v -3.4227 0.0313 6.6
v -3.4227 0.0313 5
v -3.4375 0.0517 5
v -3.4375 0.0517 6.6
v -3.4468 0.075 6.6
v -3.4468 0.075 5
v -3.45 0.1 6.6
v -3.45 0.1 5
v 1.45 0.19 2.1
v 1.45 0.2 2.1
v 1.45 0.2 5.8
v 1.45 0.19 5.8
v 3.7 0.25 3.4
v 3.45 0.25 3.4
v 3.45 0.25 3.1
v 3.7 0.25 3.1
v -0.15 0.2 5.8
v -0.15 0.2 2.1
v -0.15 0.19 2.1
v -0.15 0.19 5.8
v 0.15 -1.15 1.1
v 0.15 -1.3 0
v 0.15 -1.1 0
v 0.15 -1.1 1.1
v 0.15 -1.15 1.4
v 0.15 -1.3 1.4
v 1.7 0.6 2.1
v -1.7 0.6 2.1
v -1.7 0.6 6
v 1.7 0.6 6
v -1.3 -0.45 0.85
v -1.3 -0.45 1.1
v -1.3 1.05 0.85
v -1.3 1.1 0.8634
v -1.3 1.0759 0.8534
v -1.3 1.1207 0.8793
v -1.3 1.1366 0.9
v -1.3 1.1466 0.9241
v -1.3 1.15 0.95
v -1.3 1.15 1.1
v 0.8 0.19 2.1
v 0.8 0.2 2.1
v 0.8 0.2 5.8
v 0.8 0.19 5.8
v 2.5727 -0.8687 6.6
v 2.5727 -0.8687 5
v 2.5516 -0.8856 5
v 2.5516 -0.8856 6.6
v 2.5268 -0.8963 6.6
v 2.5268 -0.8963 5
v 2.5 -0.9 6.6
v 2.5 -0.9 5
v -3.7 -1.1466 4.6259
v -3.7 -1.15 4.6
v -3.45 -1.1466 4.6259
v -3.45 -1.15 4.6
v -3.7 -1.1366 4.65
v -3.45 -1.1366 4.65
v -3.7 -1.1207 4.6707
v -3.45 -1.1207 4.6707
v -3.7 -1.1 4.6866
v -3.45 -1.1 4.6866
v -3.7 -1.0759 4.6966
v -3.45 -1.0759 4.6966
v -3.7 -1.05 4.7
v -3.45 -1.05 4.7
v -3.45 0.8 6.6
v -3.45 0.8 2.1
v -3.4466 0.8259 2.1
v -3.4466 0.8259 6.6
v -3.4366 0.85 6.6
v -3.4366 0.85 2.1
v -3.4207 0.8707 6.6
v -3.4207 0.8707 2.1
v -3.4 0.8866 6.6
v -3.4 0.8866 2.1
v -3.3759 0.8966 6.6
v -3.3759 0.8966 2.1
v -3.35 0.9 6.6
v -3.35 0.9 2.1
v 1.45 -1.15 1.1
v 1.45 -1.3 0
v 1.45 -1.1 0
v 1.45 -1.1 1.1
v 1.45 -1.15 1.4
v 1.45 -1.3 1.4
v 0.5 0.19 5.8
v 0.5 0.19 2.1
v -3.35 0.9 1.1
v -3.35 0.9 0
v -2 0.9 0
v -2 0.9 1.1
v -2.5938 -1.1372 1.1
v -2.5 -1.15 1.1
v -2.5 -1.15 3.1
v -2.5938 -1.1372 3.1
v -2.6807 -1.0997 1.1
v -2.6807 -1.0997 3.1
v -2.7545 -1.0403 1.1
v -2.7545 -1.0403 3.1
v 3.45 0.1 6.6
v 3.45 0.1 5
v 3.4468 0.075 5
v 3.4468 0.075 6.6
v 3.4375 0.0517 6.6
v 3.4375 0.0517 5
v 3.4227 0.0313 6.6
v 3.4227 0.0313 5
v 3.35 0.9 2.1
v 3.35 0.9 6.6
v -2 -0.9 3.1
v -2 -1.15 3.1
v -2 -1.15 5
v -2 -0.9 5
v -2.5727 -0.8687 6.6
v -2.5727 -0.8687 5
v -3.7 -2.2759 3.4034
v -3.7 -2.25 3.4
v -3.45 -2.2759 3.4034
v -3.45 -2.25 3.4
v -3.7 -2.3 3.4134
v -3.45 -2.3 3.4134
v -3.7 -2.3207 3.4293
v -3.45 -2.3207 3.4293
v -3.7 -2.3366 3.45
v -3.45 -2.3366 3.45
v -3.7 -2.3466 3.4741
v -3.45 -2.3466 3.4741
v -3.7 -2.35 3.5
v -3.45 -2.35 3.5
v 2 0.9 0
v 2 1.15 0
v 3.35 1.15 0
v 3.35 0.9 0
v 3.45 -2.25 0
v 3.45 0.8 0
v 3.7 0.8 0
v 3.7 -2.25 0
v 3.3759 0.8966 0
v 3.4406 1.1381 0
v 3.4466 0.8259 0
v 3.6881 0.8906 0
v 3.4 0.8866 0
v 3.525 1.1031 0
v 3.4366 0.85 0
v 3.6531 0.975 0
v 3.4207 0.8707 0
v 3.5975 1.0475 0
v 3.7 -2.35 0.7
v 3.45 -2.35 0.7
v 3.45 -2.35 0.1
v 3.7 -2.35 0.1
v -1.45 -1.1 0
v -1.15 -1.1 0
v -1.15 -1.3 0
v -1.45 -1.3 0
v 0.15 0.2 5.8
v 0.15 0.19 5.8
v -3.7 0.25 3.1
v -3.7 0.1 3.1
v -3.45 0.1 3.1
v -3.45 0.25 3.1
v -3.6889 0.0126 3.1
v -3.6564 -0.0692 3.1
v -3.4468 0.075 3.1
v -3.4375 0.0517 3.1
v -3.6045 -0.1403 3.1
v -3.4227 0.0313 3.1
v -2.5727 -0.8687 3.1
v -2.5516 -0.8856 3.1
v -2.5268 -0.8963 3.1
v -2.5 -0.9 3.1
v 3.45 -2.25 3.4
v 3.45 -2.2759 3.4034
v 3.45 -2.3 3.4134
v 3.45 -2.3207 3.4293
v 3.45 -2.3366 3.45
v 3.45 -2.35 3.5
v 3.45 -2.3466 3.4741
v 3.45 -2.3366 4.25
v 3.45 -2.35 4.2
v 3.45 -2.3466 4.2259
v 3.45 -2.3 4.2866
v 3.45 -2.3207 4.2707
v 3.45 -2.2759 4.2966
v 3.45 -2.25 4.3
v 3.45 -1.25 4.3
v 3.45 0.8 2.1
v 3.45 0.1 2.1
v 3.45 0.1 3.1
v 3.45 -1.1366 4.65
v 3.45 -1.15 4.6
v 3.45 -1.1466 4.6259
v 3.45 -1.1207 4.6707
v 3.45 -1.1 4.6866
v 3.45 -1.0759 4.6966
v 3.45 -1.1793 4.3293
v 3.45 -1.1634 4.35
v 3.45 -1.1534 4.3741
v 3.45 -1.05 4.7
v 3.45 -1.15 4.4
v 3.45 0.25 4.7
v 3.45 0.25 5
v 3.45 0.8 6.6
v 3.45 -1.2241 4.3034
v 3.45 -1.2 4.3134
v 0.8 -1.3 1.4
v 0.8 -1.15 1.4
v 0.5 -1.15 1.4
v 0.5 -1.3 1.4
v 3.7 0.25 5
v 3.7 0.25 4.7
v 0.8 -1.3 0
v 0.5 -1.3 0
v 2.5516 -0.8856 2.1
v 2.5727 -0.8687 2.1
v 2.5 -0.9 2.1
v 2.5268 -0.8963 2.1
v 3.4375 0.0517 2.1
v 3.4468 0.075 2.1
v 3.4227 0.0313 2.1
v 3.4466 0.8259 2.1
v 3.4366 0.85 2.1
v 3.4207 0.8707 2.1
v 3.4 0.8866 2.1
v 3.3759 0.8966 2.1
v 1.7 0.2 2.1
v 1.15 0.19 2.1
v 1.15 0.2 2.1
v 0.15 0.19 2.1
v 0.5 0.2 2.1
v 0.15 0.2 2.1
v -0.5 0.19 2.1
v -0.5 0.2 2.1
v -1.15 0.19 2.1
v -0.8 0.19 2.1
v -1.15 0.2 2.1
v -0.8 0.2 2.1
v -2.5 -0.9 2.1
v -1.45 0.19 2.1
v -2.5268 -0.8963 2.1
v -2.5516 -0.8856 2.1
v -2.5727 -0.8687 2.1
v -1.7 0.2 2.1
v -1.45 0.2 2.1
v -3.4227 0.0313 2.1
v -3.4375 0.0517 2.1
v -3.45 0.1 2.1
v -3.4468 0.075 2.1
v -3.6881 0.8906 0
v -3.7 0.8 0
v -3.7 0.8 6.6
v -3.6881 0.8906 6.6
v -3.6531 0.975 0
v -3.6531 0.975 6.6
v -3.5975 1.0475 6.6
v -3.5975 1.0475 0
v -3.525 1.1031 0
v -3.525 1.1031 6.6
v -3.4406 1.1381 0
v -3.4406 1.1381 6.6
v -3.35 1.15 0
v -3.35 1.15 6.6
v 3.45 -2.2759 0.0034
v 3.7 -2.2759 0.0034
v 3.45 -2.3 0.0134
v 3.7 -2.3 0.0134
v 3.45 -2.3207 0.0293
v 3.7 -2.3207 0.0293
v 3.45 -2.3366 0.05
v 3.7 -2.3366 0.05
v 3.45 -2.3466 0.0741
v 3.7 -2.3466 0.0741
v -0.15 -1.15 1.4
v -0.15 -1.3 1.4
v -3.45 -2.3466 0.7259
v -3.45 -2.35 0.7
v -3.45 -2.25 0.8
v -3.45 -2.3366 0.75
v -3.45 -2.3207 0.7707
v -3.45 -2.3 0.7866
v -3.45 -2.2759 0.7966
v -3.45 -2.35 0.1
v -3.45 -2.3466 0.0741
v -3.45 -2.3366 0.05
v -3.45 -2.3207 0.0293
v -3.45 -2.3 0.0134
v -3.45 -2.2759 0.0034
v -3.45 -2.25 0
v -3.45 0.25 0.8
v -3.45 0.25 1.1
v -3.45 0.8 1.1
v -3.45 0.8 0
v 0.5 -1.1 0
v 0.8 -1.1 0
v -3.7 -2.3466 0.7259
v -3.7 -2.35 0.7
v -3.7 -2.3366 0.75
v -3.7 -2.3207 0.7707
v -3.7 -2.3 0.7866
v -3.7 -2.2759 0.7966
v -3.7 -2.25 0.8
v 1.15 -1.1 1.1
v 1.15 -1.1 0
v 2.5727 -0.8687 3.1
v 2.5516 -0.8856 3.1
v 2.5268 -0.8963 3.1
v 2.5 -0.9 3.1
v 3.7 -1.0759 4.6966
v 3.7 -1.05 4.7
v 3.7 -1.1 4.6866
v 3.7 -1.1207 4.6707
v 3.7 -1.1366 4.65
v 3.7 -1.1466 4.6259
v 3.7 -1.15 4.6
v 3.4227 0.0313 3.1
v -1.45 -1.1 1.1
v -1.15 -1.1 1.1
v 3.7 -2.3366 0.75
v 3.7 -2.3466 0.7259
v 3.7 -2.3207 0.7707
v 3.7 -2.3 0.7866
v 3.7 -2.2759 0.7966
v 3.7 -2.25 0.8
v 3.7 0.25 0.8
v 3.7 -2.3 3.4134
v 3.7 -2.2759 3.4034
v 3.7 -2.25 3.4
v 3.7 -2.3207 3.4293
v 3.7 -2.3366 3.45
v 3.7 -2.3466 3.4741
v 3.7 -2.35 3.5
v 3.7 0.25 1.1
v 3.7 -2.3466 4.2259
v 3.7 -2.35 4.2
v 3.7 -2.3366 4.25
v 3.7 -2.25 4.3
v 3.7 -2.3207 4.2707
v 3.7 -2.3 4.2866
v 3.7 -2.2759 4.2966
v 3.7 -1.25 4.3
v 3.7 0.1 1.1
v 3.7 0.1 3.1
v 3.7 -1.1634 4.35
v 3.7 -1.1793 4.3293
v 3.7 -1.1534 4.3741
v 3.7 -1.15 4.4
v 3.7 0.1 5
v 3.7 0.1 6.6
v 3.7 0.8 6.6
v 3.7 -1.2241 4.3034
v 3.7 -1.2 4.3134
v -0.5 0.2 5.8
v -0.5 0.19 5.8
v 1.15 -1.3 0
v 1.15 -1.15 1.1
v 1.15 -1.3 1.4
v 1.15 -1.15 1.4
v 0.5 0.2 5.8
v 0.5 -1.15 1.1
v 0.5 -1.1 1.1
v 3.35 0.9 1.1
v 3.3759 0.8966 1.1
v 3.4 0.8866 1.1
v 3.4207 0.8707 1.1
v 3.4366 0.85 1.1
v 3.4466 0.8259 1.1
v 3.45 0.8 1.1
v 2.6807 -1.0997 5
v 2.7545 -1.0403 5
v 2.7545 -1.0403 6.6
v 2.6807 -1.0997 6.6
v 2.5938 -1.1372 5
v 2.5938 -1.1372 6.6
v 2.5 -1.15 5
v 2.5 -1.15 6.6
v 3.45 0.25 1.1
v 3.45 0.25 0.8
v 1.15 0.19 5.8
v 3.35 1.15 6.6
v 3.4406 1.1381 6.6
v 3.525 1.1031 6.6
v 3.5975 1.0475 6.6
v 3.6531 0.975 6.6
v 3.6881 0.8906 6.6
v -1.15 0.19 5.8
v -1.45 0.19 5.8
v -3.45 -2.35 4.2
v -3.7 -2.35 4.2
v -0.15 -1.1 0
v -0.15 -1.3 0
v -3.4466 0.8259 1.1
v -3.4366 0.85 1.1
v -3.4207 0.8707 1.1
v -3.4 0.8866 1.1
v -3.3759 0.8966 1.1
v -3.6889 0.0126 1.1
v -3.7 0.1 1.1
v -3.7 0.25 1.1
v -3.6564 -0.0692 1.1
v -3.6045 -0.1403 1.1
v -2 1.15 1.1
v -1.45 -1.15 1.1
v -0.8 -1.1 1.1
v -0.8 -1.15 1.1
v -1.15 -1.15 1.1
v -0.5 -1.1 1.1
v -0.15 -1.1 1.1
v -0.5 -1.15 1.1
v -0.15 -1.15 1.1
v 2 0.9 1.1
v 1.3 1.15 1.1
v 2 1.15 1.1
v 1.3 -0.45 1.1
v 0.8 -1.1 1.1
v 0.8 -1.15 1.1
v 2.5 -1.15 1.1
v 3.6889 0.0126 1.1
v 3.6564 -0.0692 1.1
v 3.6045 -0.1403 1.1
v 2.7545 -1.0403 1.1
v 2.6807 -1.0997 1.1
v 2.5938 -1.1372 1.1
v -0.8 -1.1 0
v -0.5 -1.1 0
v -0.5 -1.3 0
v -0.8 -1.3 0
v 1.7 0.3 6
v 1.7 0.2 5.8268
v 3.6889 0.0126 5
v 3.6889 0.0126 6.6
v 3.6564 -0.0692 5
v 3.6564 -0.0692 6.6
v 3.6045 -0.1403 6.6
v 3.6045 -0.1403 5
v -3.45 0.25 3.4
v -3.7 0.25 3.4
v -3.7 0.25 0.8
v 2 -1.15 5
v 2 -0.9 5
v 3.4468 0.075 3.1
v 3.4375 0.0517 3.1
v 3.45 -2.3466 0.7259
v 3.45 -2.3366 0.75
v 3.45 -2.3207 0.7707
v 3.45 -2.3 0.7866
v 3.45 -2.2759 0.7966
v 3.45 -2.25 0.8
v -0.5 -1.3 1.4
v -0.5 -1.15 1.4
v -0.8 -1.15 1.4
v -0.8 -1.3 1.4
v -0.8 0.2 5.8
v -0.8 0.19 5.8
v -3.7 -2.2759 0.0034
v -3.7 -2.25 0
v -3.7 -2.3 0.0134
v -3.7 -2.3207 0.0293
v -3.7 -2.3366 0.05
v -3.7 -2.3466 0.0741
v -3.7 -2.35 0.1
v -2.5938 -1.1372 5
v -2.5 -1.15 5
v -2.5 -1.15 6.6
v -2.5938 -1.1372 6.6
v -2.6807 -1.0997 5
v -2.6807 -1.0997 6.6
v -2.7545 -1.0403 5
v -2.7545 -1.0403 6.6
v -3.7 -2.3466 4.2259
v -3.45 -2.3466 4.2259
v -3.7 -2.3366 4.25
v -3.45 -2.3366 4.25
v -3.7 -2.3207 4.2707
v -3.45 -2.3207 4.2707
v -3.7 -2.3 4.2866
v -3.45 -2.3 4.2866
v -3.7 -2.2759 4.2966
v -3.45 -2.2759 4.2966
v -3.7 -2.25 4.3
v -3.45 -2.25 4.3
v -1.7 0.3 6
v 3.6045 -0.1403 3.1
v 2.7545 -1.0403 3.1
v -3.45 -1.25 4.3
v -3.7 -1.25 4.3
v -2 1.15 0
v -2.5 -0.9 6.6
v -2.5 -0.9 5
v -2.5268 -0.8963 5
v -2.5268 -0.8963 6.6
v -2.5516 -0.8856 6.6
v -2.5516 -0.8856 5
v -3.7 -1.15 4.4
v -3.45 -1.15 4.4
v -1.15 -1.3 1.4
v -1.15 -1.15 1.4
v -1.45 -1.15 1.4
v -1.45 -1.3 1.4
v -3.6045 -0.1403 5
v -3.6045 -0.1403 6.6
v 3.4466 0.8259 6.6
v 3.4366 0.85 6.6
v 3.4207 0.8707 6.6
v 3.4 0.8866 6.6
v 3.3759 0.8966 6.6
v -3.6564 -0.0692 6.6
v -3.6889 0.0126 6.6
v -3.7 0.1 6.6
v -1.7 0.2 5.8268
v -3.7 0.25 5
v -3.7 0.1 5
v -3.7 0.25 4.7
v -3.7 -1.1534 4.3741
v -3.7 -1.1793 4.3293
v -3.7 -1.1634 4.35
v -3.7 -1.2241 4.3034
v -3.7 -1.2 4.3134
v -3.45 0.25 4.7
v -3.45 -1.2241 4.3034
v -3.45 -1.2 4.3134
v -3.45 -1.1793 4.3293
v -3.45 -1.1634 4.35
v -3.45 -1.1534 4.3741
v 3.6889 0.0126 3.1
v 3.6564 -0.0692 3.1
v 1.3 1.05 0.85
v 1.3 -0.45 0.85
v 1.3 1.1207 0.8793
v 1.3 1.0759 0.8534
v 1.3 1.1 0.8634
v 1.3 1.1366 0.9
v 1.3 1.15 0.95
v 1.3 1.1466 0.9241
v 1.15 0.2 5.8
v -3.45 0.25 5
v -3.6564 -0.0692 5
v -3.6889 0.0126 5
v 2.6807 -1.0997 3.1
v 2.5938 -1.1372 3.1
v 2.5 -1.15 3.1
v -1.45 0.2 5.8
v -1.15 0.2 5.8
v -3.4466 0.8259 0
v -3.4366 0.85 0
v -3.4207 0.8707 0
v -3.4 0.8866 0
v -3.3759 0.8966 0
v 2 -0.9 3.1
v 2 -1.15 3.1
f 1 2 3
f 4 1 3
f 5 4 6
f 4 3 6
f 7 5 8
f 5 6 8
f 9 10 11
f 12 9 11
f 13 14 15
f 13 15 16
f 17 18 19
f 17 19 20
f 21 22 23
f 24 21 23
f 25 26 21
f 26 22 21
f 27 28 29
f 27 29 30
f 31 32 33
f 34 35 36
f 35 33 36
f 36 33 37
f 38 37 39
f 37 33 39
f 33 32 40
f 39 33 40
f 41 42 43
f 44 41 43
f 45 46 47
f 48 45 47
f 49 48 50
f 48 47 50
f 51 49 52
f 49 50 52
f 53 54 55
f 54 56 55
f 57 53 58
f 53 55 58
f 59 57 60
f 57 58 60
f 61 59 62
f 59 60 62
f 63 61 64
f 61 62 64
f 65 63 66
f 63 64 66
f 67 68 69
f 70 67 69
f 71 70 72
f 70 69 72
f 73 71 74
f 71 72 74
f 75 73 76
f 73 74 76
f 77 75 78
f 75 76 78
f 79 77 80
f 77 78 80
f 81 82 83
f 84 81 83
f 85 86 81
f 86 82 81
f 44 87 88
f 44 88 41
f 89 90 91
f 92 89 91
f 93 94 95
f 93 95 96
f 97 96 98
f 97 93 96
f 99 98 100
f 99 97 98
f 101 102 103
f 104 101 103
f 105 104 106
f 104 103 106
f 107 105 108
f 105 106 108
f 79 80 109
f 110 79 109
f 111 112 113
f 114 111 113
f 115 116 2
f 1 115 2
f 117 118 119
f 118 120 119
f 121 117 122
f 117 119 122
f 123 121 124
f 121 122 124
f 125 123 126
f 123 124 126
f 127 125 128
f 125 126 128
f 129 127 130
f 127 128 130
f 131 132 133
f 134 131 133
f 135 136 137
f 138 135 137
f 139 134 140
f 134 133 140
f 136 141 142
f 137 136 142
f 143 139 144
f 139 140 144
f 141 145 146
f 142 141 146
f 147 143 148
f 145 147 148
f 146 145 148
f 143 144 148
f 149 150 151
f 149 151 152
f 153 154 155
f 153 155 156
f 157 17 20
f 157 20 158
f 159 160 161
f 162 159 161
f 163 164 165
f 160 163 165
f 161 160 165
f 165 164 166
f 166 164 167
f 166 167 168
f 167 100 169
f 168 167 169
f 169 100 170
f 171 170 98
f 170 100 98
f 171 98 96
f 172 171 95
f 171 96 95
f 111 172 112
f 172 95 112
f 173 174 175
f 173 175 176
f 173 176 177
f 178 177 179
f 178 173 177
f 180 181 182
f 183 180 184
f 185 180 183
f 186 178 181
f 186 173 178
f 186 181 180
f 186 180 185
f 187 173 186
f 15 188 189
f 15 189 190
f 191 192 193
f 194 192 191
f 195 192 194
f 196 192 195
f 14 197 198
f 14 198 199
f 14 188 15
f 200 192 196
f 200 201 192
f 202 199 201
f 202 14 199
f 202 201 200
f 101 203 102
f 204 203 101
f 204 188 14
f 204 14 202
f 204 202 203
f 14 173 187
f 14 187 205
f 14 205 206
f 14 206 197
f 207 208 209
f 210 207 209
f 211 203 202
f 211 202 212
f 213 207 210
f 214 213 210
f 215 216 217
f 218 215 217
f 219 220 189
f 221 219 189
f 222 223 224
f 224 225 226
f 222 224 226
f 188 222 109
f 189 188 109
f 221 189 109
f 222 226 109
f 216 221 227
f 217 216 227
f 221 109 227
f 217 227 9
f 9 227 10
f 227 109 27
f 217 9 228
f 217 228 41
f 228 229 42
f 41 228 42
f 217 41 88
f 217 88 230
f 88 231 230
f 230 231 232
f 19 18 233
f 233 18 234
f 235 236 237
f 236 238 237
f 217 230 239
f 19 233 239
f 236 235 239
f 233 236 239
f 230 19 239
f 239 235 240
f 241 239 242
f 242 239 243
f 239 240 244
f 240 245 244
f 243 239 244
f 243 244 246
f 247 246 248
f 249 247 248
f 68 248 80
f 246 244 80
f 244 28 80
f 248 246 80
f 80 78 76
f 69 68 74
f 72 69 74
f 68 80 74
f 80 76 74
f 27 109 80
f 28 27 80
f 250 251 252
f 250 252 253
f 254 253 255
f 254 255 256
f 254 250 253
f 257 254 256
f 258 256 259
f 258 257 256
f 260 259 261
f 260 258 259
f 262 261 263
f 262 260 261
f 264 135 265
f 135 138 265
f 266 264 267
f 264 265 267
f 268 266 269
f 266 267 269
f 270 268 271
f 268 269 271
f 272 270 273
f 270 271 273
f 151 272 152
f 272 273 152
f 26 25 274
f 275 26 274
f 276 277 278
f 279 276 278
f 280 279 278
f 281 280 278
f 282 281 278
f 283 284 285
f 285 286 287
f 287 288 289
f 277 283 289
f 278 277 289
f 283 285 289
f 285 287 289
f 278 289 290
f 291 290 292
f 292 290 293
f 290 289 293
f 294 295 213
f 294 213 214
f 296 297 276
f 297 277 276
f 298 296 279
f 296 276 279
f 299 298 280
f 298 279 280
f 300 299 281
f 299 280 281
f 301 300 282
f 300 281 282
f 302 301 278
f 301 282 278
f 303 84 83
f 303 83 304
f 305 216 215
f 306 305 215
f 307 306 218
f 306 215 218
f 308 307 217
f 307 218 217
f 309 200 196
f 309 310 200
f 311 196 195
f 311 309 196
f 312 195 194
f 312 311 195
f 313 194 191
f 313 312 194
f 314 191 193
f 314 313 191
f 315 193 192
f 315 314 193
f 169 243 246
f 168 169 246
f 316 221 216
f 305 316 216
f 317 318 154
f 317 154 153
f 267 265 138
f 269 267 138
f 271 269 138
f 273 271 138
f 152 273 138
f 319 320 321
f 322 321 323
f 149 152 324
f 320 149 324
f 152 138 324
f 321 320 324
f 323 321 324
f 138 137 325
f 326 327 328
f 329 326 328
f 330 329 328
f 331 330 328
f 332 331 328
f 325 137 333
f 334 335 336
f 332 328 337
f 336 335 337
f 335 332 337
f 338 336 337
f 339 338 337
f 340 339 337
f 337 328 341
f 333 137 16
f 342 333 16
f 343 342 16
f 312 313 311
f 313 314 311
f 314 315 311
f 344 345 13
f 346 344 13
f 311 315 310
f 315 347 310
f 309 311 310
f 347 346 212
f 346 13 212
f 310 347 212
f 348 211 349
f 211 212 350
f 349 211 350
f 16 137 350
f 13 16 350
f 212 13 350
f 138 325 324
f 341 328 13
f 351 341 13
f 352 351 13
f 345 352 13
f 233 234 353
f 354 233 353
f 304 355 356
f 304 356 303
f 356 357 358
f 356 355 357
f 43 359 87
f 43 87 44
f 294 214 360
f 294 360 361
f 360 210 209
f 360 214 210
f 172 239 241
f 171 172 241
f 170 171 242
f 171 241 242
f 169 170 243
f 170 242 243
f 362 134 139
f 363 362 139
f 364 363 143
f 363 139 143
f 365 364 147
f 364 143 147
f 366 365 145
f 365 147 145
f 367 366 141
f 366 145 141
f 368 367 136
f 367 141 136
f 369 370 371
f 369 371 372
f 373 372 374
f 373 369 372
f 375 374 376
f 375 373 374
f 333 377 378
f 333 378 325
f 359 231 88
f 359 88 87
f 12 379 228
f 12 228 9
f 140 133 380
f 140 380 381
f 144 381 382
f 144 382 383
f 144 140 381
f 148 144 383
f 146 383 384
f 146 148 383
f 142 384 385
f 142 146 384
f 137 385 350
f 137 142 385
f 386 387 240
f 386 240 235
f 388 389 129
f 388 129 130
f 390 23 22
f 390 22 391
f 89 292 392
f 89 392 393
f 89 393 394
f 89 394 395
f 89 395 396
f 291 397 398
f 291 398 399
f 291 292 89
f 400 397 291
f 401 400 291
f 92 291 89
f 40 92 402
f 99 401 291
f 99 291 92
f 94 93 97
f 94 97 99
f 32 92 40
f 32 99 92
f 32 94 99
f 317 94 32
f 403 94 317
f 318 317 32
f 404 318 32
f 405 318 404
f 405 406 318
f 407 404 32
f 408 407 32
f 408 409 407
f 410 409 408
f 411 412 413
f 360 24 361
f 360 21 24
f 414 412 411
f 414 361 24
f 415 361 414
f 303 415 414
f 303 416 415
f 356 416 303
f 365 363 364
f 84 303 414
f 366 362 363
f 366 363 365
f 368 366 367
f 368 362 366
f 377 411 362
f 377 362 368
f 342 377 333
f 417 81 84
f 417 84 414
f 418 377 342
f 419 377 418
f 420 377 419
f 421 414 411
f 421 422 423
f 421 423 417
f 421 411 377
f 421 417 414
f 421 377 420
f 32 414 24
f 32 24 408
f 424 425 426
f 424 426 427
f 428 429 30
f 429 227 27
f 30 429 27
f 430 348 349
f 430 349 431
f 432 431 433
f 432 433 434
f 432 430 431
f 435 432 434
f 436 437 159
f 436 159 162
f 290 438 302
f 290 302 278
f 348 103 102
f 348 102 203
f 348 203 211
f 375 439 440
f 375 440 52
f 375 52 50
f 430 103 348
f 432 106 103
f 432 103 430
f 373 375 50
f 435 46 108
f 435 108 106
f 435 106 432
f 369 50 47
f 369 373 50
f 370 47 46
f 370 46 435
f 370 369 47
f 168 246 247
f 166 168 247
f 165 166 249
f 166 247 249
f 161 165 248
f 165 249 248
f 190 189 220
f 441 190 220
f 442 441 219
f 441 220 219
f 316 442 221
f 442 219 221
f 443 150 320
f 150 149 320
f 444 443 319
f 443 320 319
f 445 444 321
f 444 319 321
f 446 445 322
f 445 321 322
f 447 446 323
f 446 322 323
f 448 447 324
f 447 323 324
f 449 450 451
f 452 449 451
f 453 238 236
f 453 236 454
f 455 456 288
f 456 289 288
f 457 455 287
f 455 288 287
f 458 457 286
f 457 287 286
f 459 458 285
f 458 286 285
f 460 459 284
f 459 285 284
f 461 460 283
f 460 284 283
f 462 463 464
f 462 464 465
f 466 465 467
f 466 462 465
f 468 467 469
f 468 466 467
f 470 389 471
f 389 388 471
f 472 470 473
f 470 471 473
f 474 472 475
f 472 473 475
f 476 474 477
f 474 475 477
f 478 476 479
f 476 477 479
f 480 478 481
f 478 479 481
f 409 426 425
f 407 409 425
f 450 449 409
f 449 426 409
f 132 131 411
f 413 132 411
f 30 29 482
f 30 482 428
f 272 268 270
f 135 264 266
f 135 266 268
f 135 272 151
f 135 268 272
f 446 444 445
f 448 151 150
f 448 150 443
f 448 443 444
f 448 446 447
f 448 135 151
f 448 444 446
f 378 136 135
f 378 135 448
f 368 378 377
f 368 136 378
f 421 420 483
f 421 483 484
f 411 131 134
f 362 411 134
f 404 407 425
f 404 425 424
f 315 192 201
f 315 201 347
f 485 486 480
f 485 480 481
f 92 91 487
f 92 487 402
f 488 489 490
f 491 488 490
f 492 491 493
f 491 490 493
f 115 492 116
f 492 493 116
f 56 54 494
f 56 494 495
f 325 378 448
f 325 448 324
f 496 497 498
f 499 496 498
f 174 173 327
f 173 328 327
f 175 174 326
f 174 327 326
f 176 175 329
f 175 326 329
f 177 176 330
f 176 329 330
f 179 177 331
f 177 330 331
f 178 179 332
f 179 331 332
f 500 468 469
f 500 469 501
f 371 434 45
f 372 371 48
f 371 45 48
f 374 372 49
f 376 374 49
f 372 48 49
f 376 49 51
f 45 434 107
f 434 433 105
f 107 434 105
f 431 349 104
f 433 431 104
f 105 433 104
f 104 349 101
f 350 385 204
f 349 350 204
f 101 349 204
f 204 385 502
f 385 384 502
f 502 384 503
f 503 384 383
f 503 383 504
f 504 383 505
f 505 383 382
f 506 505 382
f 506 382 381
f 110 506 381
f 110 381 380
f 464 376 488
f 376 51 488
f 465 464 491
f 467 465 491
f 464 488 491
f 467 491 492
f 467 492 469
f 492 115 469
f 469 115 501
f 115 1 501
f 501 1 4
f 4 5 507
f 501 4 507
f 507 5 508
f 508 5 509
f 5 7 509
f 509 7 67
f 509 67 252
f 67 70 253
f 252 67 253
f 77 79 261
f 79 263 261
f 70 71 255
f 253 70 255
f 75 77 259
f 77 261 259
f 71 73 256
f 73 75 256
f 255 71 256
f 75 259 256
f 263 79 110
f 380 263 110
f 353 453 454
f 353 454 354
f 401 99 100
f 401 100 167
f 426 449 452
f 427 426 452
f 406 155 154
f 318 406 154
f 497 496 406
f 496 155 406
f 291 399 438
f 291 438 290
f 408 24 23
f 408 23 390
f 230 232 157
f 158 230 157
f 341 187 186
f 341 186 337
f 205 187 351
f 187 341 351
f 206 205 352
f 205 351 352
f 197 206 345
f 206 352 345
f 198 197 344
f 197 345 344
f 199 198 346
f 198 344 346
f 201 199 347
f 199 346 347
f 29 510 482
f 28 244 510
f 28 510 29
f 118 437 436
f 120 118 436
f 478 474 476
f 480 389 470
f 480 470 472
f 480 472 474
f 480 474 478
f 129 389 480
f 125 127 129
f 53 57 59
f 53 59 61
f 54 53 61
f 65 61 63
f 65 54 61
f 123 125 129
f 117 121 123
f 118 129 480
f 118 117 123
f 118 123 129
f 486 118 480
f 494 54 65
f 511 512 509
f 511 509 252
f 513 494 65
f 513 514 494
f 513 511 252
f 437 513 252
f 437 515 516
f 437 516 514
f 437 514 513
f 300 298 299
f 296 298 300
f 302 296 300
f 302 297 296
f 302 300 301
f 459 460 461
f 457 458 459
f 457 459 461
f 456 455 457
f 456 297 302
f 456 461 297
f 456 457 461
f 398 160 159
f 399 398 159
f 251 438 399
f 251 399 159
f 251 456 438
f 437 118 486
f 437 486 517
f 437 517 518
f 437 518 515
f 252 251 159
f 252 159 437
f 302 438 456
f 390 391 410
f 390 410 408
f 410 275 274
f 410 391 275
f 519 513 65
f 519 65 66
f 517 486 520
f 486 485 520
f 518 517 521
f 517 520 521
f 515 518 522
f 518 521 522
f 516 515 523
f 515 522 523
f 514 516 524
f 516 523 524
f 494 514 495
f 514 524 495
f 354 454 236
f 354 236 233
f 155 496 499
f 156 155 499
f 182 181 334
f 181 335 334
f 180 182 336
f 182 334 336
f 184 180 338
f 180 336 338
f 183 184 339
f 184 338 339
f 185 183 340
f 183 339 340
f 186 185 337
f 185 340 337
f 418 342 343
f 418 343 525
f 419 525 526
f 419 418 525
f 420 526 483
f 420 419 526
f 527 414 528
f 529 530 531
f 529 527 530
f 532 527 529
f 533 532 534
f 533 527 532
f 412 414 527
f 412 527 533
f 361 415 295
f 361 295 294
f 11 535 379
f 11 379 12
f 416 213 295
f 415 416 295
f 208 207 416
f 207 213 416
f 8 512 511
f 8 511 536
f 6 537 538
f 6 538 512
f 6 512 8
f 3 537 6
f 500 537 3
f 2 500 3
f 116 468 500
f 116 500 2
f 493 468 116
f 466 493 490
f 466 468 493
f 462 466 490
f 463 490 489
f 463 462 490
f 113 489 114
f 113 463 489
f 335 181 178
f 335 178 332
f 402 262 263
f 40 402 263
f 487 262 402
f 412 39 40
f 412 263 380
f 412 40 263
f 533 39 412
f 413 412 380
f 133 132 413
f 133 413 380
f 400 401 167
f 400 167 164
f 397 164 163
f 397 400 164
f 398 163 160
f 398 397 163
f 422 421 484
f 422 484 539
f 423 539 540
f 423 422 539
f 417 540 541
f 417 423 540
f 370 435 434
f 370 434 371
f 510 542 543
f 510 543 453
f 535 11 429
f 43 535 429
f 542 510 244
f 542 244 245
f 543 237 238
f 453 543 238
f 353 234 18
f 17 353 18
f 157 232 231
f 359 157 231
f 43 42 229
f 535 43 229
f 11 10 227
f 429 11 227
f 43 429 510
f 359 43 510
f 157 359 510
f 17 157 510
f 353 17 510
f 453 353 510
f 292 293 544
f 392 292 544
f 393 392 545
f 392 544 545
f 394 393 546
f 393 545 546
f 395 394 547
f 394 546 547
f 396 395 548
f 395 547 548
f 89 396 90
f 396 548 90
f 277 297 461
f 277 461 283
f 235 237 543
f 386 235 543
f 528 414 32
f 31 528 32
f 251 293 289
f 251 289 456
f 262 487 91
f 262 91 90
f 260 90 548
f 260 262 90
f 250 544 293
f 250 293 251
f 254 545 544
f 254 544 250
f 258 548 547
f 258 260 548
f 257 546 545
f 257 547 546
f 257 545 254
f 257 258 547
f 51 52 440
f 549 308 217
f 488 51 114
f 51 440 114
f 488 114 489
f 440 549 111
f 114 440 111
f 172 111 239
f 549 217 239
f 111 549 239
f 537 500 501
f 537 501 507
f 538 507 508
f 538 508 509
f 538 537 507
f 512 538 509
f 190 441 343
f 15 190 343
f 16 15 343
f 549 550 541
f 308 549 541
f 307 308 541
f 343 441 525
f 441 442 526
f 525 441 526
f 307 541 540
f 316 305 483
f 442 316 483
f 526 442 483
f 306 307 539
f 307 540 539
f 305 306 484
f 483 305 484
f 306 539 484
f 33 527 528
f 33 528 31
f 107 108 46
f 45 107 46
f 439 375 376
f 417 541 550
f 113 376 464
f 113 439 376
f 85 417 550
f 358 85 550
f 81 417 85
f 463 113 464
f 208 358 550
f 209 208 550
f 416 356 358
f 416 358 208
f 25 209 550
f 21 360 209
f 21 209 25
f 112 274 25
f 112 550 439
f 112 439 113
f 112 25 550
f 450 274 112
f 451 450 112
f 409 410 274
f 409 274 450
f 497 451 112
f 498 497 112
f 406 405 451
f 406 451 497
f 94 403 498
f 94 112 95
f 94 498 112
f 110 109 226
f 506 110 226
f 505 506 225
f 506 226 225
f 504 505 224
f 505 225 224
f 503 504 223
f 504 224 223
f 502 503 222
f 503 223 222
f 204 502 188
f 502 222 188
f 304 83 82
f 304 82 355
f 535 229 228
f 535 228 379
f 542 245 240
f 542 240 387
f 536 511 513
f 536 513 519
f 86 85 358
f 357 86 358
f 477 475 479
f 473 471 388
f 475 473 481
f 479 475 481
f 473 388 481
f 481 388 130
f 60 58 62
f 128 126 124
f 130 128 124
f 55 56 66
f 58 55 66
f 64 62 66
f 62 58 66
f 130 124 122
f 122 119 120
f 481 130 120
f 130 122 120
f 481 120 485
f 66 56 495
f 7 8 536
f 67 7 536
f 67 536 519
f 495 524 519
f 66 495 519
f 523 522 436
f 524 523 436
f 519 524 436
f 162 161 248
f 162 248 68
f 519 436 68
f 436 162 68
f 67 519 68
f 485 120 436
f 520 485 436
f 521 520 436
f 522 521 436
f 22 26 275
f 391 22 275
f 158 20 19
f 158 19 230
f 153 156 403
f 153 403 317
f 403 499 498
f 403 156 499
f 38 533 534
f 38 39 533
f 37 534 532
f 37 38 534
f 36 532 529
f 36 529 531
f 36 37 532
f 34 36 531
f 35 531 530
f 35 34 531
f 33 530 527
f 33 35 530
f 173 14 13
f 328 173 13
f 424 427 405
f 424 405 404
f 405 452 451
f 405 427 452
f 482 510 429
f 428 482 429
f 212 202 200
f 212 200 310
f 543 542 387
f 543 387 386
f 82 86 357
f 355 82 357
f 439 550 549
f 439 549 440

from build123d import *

# Parameters (mm, degrees)
EXTRUDE_1_DEPTH     = 6.6
SKETCH_2_W          = 4
SKETCH_2_H          = 1.1
CUT_EXTRUDE_1_DEPTH = 6.6
EXTRUDE_2_DEPTH     = 1
SKETCH_4_W          = 3.4
SKETCH_4_H          = 0.4
EXTRUDE_3_DEPTH     = 3.9
CHAMFER_1_SIZE      = 0.1
CHAMFER_1_SIZE2     = 0.173205081
SKETCH_5_W          = 8
SKETCH_5_H          = 1.5
SKETCH_5_W_2        = 2
SKETCH_5_H_2        = 1.9
CUT_EXTRUDE_2_DEPTH = 1.4
SKETCH_6_W          = 0.25
SKETCH_6_H          = 0.8
SKETCH_6_H_2        = 0.9
EXTRUDE_5_DEPTH     = 2.6
SKETCH_7_W          = 0.25
SKETCH_7_H          = 0.4
EXTRUDE_6_DEPTH     = 1.4
SKETCH_8_W          = 0.3
SKETCH_8_H          = 0.2
EXTRUDE_7_DEPTH     = 1.4
SKETCH_9_W          = 0.3
SKETCH_9_H          = 3.7
EXTRUDE_8_DEPTH     = 0.01
SKETCH_10_W         = 2.6
SKETCH_10_H         = 1.6
EXTRUDE_9_DEPTH     = 0.25
FILLET_1_R          = 0.1


with BuildPart() as part:
    # 草图1 → 凸台-拉伸1 (new body)
    with BuildSketch(Plane.XY):
        with BuildLine():
            Line((-3.35, 1.15), (3.35, 1.15))
            ThreePointArc((3.35, 1.15), (3.597487373, 1.047487373), (3.7, 0.8))
            Line((3.7, 0.8), (3.7, 0.1))
            ThreePointArc((3.7, 0.1), (3.675237691, -0.029307557), (3.604454603, -0.140318237))
            Line((3.604454603, -0.140318237), (2.754454603, -1.040318237))
            ThreePointArc((2.754454603, -1.040318237), (2.638543526, -1.121412027), (2.5, -1.15))
            Line((2.5, -1.15), (-2.5, -1.15))
            ThreePointArc((-2.5, -1.15), (-2.638543526, -1.121412027), (-2.754454603, -1.040318237))
            Line((-2.754454603, -1.040318237), (-3.604454603, -0.140318237))
            ThreePointArc((-3.604454603, -0.140318237), (-3.675237691, -0.029307557), (-3.7, 0.1))
            Line((-3.7, 0.1), (-3.7, 0.8))
            ThreePointArc((-3.7, 0.8), (-3.597487373, 1.047487373), (-3.35, 1.15))
        make_face()
        with BuildLine():
            Line((-3.35, 0.9), (3.35, 0.9))
            ThreePointArc((3.35, 0.9), (3.420710678, 0.870710678), (3.45, 0.8))
            Line((3.45, 0.8), (3.45, 0.1))
            ThreePointArc((3.45, 0.1), (3.442925055, 0.063054984), (3.422701315, 0.031337647))
            Line((3.422701315, 0.031337647), (2.572701315, -0.868662353))
            ThreePointArc((2.572701315, -0.868662353), (2.539583865, -0.891832008), (2.5, -0.9))
            Line((2.5, -0.9), (-2.5, -0.9))
            ThreePointArc((-2.5, -0.9), (-2.539583865, -0.891832008), (-2.572701315, -0.868662353))
            Line((-2.572701315, -0.868662353), (-3.422701315, 0.031337647))
            ThreePointArc((-3.422701315, 0.031337647), (-3.442925055, 0.063054984), (-3.45, 0.1))
            Line((-3.45, 0.1), (-3.45, 0.8))
            ThreePointArc((-3.45, 0.8), (-3.420710678, 0.870710678), (-3.35, 0.9))
        make_face(mode=Mode.SUBTRACT)
    extrude(amount=EXTRUDE_1_DEPTH)

    # 草图2 → 切除-拉伸1 (cut)
    with BuildSketch(Plane.XZ.offset(1.15)):
        with Locations((0, 0.55)):
            Rectangle(SKETCH_2_W, SKETCH_2_H)
    extrude(amount=-CUT_EXTRUDE_1_DEPTH, mode=Mode.SUBTRACT)

    # 草图3 → 凸台-拉伸2 (add)
    with BuildSketch(Plane(origin=(0, 0, 1.1), x_dir=(-1, 0, 0), z_dir=(0, 0, -1))):
        with BuildLine():
            Line((2.572701315, -0.868662353), (3.422701315, 0.031337647))
            ThreePointArc((3.422701315, 0.031337647), (3.442925055, 0.063054984), (3.45, 0.1))
            Line((3.45, 0.1), (3.45, 0.8))
            ThreePointArc((3.45, 0.8), (3.420710678, 0.870710678), (3.35, 0.9))
            Line((3.35, 0.9), (-3.35, 0.9))
            ThreePointArc((-3.35, 0.9), (-3.420710678, 0.870710678), (-3.45, 0.8))
            Line((-3.45, 0.8), (-3.45, 0.1))
            ThreePointArc((-3.45, 0.1), (-3.442925055, 0.063054984), (-3.422701315, 0.031337647))
            Line((-3.422701315, 0.031337647), (-2.572701315, -0.868662353))
            ThreePointArc((-2.572701315, -0.868662353), (-2.539583865, -0.891832008), (-2.5, -0.9))
            Line((-2.5, -0.9), (2.5, -0.9))
            ThreePointArc((2.5, -0.9), (2.539583865, -0.891832008), (2.572701315, -0.868662353))
        make_face()
    extrude(amount=-EXTRUDE_2_DEPTH)

    # 草图4 → 凸台-拉伸3 (add)
    with BuildSketch(Plane.XY.offset(2.1)):
        with Locations((0, 0.4)):
            Rectangle(SKETCH_4_W, SKETCH_4_H)
    extrude(amount=EXTRUDE_3_DEPTH)

    # 倒角1
    chamfer_1_edges = [part.edges().sort_by_distance(p)[0] for p in [
        (0, 0.2, 6),
    ]]
    chamfer_1_side = [part.faces().sort_by_distance(p)[0] for p in [
        (0, 0.4, 6),
    ]]
    chamfer(chamfer_1_edges, length=CHAMFER_1_SIZE, length2=CHAMFER_1_SIZE2, reference=chamfer_1_side[0])

    # 草图5 → 切除-拉伸2 (cut)
    with BuildSketch(Plane.XZ.offset(1.15)):
        with Locations((0, 0.35)):
            Rectangle(SKETCH_5_W, SKETCH_5_H)
        with Locations((3, 4.05)):
            Rectangle(SKETCH_5_W_2, SKETCH_5_H_2)
        with Locations((-3, 4.05)):
            Rectangle(SKETCH_5_W_2, SKETCH_5_H_2)
    extrude(amount=-CUT_EXTRUDE_2_DEPTH, mode=Mode.SUBTRACT)

    # 草图6 → 凸台-拉伸5 (add)
    with BuildSketch(Plane.XZ.offset(-0.25)):
        with Locations((3.575, 0.4)):
            Rectangle(SKETCH_6_W, SKETCH_6_H)
        with Locations((3.575, 3.85)):
            Rectangle(SKETCH_6_W, SKETCH_6_H_2)
        with Locations((-3.575, 3.85)):
            Rectangle(SKETCH_6_W, SKETCH_6_H_2)
        with Locations((-3.575, 0.4)):
            Rectangle(SKETCH_6_W, SKETCH_6_H)
    extrude(amount=EXTRUDE_5_DEPTH)

    # 草图7 → 凸台-拉伸6 (add)
    with BuildSketch(Plane.XZ.offset(-0.25)):
        with Locations((3.575, 4.5)):
            Rectangle(SKETCH_7_W, SKETCH_7_H)
        with Locations((-3.575, 4.5)):
            Rectangle(SKETCH_7_W, SKETCH_7_H)
    extrude(amount=EXTRUDE_6_DEPTH)

    # 草图8 → 凸台-拉伸7 (add)
    with BuildSketch(Plane(origin=(0, 0, 1.4), x_dir=(-1, 0, 0), z_dir=(0, 0, -1))):
        with Locations((-0.65, -1.2)):
            Rectangle(SKETCH_8_W, SKETCH_8_H)
        with Locations((0, -1.2)):
            Rectangle(SKETCH_8_W, SKETCH_8_H)
        with Locations((0.65, -1.2)):
            Rectangle(SKETCH_8_W, SKETCH_8_H)
        with Locations((1.3, -1.2)):
            Rectangle(SKETCH_8_W, SKETCH_8_H)
        with Locations((-1.3, -1.2)):
            Rectangle(SKETCH_8_W, SKETCH_8_H)
    extrude(amount=EXTRUDE_7_DEPTH)

    # 草图9 → 凸台-拉伸8 (add)
    with BuildSketch(Plane.XZ.offset(-0.2)):
        with Locations((-1.3, 3.95)):
            Rectangle(SKETCH_9_W, SKETCH_9_H)
        with Locations((-0.65, 3.95)):
            Rectangle(SKETCH_9_W, SKETCH_9_H)
        with Locations((0, 3.95)):
            Rectangle(SKETCH_9_W, SKETCH_9_H)
        with Locations((0.65, 3.95)):
            Rectangle(SKETCH_9_W, SKETCH_9_H)
        with Locations((1.3, 3.95)):
            Rectangle(SKETCH_9_W, SKETCH_9_H)
    extrude(amount=EXTRUDE_8_DEPTH)

    # 草图10 → 凸台-拉伸9 (add)
    with BuildSketch(Plane(origin=(0, 0, 1.1), x_dir=(-1, 0, 0), z_dir=(0, 0, -1))):
        with Locations((0, 0.35)):
            Rectangle(SKETCH_10_W, SKETCH_10_H)
    extrude(amount=EXTRUDE_9_DEPTH)

    # 圆角1
    fillet_1_edges = [part.edges().sort_by_distance(p)[0] for p in [
        (3.575, -2.35, 0),
        (3.575, -2.35, 0.8),
        (3.575, -2.35, 3.4),
        (3.575, -2.35, 4.3),
        (-3.575, -2.35, 4.3),
        (-3.575, -2.35, 3.4),
        (-3.575, -2.35, 0.8),
        (-3.575, -2.35, 0),
        (3.575, -1.15, 4.3),
        (3.575, -1.15, 4.7),
        (-3.575, -1.15, 4.7),
        (-3.575, -1.15, 4.3),
        (0, 1.15, 0.85),
    ]]
    fillet(fillet_1_edges, radius=FILLET_1_R)


solid = part.part
